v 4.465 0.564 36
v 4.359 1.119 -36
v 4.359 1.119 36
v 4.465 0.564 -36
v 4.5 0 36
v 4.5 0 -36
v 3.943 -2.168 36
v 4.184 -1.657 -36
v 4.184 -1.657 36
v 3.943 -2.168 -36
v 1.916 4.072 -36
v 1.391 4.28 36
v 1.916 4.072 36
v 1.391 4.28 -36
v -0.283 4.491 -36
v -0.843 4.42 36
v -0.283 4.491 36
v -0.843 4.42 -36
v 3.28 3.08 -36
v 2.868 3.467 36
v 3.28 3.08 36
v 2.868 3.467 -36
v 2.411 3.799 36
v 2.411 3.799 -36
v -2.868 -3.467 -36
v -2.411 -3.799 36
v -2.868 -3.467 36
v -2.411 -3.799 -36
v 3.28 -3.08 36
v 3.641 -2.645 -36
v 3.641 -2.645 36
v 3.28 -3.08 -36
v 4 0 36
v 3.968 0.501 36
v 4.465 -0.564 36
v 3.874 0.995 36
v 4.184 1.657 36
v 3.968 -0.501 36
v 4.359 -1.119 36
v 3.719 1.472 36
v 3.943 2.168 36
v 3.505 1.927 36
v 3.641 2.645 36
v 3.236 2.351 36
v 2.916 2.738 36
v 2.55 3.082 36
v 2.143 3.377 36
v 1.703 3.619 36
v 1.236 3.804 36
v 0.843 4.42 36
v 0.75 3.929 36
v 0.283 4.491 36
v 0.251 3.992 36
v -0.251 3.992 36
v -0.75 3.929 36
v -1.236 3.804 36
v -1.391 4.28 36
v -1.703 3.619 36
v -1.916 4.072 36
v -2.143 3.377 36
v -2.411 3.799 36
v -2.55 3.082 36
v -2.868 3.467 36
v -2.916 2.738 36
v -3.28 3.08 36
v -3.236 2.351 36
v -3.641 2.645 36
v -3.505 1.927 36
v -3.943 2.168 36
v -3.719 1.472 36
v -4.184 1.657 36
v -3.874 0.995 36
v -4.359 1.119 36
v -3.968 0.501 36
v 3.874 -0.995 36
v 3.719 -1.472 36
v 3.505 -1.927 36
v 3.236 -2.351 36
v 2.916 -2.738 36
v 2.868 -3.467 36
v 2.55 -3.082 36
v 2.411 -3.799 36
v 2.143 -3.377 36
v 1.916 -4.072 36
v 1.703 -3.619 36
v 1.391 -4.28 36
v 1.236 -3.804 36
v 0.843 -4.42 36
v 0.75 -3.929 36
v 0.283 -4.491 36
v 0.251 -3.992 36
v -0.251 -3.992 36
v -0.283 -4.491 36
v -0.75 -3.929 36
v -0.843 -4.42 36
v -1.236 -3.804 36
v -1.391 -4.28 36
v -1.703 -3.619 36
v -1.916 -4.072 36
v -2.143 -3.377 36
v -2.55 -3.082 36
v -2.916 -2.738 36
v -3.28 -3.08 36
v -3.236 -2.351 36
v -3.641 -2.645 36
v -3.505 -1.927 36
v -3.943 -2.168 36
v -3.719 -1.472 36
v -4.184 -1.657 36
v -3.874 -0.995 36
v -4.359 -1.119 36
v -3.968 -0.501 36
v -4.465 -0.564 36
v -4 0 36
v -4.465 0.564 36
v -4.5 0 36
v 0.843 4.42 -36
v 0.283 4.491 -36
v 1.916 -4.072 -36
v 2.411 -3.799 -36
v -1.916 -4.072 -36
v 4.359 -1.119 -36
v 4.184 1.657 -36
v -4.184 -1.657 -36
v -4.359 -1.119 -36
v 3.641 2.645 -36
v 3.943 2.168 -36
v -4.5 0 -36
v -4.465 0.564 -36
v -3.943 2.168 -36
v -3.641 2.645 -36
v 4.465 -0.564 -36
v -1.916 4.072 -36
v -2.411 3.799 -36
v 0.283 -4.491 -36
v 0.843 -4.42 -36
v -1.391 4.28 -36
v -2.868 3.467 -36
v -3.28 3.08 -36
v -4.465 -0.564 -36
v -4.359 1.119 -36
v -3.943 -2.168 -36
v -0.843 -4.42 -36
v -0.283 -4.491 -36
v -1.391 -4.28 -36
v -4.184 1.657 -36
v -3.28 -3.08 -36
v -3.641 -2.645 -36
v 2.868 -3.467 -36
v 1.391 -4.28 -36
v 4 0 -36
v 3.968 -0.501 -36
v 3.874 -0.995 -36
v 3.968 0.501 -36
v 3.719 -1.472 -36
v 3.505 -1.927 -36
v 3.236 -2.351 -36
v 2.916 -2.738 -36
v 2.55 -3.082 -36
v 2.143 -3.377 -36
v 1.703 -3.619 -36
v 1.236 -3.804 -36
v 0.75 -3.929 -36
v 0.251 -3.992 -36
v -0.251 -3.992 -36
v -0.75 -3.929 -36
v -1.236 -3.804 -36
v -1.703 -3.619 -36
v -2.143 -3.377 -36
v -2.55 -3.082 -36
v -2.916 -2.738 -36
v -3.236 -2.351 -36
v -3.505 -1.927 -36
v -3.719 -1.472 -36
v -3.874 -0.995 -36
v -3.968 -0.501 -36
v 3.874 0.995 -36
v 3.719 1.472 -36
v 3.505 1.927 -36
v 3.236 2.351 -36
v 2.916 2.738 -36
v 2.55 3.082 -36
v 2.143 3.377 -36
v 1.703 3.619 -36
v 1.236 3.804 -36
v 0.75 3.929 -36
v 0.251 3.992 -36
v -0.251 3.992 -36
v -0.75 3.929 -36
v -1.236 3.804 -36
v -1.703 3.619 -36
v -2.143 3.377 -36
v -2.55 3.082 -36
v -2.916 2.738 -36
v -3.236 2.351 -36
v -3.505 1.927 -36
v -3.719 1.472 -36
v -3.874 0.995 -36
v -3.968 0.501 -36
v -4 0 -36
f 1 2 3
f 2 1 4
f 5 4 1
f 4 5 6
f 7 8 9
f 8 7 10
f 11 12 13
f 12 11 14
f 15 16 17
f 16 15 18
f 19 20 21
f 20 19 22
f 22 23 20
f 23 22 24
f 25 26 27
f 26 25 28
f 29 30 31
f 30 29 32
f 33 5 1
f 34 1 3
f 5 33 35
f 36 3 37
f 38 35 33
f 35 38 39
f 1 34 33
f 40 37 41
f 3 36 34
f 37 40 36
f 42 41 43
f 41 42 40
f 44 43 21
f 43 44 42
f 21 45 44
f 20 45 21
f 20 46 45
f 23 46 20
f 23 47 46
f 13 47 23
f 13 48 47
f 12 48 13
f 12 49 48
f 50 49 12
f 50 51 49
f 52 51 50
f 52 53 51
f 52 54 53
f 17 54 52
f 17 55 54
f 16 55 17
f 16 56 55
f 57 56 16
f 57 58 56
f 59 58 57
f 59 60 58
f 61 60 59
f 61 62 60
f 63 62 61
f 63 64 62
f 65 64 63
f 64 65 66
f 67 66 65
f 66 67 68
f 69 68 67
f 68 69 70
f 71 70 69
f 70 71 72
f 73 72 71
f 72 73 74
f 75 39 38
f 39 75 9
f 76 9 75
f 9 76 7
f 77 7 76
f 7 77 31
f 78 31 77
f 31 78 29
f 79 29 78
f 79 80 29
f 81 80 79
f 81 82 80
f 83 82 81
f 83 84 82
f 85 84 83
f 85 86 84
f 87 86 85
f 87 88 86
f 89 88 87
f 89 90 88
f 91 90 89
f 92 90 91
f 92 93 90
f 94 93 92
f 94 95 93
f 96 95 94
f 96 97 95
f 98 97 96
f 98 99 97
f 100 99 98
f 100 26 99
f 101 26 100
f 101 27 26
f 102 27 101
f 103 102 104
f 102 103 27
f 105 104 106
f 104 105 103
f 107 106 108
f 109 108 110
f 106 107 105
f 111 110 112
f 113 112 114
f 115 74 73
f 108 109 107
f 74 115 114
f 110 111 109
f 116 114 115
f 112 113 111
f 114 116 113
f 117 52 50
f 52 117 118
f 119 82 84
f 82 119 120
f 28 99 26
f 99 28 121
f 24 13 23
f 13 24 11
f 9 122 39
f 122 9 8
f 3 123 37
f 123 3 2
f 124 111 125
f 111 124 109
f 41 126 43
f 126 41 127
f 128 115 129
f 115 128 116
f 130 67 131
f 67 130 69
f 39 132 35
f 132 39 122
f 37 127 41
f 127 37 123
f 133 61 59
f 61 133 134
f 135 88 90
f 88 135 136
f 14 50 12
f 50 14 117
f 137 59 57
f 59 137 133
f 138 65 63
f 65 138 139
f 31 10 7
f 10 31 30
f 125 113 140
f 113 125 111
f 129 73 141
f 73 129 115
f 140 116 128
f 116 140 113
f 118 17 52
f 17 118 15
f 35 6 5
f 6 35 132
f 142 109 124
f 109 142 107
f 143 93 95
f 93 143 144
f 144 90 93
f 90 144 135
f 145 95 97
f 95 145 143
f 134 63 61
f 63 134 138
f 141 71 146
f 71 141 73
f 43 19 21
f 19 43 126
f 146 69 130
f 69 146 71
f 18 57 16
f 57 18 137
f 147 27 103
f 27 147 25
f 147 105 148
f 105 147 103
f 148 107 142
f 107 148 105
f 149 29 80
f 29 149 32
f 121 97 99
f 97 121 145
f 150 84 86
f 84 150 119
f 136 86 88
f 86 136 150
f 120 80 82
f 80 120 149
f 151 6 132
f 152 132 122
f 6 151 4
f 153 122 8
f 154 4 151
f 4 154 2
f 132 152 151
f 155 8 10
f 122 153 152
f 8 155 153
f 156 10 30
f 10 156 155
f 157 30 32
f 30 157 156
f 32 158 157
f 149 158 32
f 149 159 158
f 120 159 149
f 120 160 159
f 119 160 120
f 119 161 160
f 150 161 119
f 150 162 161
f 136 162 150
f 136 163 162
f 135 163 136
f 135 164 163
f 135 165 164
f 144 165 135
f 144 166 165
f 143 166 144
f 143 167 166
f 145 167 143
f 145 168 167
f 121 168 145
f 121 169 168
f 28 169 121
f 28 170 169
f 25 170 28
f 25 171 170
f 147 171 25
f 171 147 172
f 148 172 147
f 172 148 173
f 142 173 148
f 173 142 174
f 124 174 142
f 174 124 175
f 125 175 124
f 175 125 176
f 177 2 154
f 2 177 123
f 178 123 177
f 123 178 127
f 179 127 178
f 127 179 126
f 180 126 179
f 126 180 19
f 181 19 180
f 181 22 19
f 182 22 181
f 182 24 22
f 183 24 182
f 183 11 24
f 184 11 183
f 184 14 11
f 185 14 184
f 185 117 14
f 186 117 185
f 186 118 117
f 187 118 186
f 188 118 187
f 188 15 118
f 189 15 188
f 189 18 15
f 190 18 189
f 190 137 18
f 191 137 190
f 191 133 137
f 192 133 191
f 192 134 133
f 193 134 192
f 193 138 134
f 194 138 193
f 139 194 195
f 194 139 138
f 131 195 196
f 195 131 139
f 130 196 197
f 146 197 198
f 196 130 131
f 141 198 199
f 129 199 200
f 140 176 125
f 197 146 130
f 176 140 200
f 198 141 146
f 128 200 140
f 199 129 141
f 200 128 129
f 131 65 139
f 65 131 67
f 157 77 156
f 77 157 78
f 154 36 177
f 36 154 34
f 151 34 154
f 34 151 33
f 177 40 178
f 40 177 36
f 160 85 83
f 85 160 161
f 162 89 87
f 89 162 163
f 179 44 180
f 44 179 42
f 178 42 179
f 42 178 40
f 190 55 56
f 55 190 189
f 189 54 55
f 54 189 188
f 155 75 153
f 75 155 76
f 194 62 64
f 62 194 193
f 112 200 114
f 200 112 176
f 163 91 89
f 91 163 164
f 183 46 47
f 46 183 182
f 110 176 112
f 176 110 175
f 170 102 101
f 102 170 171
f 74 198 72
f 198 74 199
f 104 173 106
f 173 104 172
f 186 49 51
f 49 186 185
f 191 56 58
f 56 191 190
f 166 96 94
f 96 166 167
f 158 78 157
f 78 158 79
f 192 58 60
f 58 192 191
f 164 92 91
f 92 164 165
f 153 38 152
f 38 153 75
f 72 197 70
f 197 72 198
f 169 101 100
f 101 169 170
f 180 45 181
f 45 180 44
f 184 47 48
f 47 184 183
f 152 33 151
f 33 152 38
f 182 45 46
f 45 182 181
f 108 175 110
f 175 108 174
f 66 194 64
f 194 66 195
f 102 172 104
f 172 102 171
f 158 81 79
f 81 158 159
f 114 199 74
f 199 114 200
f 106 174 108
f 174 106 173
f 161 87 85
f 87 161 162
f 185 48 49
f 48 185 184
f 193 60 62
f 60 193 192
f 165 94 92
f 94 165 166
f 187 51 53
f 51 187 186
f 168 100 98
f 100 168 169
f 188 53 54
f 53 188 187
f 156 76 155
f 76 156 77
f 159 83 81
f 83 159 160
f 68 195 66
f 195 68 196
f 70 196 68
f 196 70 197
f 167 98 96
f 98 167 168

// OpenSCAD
$fn = 50;


difference() {
	union() {
		translate(v = [0, 0, -36.0000000000]) {
			cylinder(h = 72, r = 4.5000000000);
		}
	}
	union() {
		translate(v = [0, 0, -100.0000000000]) {
			cylinder(h = 200, r = 4.0000000000);
		}
	}
}
